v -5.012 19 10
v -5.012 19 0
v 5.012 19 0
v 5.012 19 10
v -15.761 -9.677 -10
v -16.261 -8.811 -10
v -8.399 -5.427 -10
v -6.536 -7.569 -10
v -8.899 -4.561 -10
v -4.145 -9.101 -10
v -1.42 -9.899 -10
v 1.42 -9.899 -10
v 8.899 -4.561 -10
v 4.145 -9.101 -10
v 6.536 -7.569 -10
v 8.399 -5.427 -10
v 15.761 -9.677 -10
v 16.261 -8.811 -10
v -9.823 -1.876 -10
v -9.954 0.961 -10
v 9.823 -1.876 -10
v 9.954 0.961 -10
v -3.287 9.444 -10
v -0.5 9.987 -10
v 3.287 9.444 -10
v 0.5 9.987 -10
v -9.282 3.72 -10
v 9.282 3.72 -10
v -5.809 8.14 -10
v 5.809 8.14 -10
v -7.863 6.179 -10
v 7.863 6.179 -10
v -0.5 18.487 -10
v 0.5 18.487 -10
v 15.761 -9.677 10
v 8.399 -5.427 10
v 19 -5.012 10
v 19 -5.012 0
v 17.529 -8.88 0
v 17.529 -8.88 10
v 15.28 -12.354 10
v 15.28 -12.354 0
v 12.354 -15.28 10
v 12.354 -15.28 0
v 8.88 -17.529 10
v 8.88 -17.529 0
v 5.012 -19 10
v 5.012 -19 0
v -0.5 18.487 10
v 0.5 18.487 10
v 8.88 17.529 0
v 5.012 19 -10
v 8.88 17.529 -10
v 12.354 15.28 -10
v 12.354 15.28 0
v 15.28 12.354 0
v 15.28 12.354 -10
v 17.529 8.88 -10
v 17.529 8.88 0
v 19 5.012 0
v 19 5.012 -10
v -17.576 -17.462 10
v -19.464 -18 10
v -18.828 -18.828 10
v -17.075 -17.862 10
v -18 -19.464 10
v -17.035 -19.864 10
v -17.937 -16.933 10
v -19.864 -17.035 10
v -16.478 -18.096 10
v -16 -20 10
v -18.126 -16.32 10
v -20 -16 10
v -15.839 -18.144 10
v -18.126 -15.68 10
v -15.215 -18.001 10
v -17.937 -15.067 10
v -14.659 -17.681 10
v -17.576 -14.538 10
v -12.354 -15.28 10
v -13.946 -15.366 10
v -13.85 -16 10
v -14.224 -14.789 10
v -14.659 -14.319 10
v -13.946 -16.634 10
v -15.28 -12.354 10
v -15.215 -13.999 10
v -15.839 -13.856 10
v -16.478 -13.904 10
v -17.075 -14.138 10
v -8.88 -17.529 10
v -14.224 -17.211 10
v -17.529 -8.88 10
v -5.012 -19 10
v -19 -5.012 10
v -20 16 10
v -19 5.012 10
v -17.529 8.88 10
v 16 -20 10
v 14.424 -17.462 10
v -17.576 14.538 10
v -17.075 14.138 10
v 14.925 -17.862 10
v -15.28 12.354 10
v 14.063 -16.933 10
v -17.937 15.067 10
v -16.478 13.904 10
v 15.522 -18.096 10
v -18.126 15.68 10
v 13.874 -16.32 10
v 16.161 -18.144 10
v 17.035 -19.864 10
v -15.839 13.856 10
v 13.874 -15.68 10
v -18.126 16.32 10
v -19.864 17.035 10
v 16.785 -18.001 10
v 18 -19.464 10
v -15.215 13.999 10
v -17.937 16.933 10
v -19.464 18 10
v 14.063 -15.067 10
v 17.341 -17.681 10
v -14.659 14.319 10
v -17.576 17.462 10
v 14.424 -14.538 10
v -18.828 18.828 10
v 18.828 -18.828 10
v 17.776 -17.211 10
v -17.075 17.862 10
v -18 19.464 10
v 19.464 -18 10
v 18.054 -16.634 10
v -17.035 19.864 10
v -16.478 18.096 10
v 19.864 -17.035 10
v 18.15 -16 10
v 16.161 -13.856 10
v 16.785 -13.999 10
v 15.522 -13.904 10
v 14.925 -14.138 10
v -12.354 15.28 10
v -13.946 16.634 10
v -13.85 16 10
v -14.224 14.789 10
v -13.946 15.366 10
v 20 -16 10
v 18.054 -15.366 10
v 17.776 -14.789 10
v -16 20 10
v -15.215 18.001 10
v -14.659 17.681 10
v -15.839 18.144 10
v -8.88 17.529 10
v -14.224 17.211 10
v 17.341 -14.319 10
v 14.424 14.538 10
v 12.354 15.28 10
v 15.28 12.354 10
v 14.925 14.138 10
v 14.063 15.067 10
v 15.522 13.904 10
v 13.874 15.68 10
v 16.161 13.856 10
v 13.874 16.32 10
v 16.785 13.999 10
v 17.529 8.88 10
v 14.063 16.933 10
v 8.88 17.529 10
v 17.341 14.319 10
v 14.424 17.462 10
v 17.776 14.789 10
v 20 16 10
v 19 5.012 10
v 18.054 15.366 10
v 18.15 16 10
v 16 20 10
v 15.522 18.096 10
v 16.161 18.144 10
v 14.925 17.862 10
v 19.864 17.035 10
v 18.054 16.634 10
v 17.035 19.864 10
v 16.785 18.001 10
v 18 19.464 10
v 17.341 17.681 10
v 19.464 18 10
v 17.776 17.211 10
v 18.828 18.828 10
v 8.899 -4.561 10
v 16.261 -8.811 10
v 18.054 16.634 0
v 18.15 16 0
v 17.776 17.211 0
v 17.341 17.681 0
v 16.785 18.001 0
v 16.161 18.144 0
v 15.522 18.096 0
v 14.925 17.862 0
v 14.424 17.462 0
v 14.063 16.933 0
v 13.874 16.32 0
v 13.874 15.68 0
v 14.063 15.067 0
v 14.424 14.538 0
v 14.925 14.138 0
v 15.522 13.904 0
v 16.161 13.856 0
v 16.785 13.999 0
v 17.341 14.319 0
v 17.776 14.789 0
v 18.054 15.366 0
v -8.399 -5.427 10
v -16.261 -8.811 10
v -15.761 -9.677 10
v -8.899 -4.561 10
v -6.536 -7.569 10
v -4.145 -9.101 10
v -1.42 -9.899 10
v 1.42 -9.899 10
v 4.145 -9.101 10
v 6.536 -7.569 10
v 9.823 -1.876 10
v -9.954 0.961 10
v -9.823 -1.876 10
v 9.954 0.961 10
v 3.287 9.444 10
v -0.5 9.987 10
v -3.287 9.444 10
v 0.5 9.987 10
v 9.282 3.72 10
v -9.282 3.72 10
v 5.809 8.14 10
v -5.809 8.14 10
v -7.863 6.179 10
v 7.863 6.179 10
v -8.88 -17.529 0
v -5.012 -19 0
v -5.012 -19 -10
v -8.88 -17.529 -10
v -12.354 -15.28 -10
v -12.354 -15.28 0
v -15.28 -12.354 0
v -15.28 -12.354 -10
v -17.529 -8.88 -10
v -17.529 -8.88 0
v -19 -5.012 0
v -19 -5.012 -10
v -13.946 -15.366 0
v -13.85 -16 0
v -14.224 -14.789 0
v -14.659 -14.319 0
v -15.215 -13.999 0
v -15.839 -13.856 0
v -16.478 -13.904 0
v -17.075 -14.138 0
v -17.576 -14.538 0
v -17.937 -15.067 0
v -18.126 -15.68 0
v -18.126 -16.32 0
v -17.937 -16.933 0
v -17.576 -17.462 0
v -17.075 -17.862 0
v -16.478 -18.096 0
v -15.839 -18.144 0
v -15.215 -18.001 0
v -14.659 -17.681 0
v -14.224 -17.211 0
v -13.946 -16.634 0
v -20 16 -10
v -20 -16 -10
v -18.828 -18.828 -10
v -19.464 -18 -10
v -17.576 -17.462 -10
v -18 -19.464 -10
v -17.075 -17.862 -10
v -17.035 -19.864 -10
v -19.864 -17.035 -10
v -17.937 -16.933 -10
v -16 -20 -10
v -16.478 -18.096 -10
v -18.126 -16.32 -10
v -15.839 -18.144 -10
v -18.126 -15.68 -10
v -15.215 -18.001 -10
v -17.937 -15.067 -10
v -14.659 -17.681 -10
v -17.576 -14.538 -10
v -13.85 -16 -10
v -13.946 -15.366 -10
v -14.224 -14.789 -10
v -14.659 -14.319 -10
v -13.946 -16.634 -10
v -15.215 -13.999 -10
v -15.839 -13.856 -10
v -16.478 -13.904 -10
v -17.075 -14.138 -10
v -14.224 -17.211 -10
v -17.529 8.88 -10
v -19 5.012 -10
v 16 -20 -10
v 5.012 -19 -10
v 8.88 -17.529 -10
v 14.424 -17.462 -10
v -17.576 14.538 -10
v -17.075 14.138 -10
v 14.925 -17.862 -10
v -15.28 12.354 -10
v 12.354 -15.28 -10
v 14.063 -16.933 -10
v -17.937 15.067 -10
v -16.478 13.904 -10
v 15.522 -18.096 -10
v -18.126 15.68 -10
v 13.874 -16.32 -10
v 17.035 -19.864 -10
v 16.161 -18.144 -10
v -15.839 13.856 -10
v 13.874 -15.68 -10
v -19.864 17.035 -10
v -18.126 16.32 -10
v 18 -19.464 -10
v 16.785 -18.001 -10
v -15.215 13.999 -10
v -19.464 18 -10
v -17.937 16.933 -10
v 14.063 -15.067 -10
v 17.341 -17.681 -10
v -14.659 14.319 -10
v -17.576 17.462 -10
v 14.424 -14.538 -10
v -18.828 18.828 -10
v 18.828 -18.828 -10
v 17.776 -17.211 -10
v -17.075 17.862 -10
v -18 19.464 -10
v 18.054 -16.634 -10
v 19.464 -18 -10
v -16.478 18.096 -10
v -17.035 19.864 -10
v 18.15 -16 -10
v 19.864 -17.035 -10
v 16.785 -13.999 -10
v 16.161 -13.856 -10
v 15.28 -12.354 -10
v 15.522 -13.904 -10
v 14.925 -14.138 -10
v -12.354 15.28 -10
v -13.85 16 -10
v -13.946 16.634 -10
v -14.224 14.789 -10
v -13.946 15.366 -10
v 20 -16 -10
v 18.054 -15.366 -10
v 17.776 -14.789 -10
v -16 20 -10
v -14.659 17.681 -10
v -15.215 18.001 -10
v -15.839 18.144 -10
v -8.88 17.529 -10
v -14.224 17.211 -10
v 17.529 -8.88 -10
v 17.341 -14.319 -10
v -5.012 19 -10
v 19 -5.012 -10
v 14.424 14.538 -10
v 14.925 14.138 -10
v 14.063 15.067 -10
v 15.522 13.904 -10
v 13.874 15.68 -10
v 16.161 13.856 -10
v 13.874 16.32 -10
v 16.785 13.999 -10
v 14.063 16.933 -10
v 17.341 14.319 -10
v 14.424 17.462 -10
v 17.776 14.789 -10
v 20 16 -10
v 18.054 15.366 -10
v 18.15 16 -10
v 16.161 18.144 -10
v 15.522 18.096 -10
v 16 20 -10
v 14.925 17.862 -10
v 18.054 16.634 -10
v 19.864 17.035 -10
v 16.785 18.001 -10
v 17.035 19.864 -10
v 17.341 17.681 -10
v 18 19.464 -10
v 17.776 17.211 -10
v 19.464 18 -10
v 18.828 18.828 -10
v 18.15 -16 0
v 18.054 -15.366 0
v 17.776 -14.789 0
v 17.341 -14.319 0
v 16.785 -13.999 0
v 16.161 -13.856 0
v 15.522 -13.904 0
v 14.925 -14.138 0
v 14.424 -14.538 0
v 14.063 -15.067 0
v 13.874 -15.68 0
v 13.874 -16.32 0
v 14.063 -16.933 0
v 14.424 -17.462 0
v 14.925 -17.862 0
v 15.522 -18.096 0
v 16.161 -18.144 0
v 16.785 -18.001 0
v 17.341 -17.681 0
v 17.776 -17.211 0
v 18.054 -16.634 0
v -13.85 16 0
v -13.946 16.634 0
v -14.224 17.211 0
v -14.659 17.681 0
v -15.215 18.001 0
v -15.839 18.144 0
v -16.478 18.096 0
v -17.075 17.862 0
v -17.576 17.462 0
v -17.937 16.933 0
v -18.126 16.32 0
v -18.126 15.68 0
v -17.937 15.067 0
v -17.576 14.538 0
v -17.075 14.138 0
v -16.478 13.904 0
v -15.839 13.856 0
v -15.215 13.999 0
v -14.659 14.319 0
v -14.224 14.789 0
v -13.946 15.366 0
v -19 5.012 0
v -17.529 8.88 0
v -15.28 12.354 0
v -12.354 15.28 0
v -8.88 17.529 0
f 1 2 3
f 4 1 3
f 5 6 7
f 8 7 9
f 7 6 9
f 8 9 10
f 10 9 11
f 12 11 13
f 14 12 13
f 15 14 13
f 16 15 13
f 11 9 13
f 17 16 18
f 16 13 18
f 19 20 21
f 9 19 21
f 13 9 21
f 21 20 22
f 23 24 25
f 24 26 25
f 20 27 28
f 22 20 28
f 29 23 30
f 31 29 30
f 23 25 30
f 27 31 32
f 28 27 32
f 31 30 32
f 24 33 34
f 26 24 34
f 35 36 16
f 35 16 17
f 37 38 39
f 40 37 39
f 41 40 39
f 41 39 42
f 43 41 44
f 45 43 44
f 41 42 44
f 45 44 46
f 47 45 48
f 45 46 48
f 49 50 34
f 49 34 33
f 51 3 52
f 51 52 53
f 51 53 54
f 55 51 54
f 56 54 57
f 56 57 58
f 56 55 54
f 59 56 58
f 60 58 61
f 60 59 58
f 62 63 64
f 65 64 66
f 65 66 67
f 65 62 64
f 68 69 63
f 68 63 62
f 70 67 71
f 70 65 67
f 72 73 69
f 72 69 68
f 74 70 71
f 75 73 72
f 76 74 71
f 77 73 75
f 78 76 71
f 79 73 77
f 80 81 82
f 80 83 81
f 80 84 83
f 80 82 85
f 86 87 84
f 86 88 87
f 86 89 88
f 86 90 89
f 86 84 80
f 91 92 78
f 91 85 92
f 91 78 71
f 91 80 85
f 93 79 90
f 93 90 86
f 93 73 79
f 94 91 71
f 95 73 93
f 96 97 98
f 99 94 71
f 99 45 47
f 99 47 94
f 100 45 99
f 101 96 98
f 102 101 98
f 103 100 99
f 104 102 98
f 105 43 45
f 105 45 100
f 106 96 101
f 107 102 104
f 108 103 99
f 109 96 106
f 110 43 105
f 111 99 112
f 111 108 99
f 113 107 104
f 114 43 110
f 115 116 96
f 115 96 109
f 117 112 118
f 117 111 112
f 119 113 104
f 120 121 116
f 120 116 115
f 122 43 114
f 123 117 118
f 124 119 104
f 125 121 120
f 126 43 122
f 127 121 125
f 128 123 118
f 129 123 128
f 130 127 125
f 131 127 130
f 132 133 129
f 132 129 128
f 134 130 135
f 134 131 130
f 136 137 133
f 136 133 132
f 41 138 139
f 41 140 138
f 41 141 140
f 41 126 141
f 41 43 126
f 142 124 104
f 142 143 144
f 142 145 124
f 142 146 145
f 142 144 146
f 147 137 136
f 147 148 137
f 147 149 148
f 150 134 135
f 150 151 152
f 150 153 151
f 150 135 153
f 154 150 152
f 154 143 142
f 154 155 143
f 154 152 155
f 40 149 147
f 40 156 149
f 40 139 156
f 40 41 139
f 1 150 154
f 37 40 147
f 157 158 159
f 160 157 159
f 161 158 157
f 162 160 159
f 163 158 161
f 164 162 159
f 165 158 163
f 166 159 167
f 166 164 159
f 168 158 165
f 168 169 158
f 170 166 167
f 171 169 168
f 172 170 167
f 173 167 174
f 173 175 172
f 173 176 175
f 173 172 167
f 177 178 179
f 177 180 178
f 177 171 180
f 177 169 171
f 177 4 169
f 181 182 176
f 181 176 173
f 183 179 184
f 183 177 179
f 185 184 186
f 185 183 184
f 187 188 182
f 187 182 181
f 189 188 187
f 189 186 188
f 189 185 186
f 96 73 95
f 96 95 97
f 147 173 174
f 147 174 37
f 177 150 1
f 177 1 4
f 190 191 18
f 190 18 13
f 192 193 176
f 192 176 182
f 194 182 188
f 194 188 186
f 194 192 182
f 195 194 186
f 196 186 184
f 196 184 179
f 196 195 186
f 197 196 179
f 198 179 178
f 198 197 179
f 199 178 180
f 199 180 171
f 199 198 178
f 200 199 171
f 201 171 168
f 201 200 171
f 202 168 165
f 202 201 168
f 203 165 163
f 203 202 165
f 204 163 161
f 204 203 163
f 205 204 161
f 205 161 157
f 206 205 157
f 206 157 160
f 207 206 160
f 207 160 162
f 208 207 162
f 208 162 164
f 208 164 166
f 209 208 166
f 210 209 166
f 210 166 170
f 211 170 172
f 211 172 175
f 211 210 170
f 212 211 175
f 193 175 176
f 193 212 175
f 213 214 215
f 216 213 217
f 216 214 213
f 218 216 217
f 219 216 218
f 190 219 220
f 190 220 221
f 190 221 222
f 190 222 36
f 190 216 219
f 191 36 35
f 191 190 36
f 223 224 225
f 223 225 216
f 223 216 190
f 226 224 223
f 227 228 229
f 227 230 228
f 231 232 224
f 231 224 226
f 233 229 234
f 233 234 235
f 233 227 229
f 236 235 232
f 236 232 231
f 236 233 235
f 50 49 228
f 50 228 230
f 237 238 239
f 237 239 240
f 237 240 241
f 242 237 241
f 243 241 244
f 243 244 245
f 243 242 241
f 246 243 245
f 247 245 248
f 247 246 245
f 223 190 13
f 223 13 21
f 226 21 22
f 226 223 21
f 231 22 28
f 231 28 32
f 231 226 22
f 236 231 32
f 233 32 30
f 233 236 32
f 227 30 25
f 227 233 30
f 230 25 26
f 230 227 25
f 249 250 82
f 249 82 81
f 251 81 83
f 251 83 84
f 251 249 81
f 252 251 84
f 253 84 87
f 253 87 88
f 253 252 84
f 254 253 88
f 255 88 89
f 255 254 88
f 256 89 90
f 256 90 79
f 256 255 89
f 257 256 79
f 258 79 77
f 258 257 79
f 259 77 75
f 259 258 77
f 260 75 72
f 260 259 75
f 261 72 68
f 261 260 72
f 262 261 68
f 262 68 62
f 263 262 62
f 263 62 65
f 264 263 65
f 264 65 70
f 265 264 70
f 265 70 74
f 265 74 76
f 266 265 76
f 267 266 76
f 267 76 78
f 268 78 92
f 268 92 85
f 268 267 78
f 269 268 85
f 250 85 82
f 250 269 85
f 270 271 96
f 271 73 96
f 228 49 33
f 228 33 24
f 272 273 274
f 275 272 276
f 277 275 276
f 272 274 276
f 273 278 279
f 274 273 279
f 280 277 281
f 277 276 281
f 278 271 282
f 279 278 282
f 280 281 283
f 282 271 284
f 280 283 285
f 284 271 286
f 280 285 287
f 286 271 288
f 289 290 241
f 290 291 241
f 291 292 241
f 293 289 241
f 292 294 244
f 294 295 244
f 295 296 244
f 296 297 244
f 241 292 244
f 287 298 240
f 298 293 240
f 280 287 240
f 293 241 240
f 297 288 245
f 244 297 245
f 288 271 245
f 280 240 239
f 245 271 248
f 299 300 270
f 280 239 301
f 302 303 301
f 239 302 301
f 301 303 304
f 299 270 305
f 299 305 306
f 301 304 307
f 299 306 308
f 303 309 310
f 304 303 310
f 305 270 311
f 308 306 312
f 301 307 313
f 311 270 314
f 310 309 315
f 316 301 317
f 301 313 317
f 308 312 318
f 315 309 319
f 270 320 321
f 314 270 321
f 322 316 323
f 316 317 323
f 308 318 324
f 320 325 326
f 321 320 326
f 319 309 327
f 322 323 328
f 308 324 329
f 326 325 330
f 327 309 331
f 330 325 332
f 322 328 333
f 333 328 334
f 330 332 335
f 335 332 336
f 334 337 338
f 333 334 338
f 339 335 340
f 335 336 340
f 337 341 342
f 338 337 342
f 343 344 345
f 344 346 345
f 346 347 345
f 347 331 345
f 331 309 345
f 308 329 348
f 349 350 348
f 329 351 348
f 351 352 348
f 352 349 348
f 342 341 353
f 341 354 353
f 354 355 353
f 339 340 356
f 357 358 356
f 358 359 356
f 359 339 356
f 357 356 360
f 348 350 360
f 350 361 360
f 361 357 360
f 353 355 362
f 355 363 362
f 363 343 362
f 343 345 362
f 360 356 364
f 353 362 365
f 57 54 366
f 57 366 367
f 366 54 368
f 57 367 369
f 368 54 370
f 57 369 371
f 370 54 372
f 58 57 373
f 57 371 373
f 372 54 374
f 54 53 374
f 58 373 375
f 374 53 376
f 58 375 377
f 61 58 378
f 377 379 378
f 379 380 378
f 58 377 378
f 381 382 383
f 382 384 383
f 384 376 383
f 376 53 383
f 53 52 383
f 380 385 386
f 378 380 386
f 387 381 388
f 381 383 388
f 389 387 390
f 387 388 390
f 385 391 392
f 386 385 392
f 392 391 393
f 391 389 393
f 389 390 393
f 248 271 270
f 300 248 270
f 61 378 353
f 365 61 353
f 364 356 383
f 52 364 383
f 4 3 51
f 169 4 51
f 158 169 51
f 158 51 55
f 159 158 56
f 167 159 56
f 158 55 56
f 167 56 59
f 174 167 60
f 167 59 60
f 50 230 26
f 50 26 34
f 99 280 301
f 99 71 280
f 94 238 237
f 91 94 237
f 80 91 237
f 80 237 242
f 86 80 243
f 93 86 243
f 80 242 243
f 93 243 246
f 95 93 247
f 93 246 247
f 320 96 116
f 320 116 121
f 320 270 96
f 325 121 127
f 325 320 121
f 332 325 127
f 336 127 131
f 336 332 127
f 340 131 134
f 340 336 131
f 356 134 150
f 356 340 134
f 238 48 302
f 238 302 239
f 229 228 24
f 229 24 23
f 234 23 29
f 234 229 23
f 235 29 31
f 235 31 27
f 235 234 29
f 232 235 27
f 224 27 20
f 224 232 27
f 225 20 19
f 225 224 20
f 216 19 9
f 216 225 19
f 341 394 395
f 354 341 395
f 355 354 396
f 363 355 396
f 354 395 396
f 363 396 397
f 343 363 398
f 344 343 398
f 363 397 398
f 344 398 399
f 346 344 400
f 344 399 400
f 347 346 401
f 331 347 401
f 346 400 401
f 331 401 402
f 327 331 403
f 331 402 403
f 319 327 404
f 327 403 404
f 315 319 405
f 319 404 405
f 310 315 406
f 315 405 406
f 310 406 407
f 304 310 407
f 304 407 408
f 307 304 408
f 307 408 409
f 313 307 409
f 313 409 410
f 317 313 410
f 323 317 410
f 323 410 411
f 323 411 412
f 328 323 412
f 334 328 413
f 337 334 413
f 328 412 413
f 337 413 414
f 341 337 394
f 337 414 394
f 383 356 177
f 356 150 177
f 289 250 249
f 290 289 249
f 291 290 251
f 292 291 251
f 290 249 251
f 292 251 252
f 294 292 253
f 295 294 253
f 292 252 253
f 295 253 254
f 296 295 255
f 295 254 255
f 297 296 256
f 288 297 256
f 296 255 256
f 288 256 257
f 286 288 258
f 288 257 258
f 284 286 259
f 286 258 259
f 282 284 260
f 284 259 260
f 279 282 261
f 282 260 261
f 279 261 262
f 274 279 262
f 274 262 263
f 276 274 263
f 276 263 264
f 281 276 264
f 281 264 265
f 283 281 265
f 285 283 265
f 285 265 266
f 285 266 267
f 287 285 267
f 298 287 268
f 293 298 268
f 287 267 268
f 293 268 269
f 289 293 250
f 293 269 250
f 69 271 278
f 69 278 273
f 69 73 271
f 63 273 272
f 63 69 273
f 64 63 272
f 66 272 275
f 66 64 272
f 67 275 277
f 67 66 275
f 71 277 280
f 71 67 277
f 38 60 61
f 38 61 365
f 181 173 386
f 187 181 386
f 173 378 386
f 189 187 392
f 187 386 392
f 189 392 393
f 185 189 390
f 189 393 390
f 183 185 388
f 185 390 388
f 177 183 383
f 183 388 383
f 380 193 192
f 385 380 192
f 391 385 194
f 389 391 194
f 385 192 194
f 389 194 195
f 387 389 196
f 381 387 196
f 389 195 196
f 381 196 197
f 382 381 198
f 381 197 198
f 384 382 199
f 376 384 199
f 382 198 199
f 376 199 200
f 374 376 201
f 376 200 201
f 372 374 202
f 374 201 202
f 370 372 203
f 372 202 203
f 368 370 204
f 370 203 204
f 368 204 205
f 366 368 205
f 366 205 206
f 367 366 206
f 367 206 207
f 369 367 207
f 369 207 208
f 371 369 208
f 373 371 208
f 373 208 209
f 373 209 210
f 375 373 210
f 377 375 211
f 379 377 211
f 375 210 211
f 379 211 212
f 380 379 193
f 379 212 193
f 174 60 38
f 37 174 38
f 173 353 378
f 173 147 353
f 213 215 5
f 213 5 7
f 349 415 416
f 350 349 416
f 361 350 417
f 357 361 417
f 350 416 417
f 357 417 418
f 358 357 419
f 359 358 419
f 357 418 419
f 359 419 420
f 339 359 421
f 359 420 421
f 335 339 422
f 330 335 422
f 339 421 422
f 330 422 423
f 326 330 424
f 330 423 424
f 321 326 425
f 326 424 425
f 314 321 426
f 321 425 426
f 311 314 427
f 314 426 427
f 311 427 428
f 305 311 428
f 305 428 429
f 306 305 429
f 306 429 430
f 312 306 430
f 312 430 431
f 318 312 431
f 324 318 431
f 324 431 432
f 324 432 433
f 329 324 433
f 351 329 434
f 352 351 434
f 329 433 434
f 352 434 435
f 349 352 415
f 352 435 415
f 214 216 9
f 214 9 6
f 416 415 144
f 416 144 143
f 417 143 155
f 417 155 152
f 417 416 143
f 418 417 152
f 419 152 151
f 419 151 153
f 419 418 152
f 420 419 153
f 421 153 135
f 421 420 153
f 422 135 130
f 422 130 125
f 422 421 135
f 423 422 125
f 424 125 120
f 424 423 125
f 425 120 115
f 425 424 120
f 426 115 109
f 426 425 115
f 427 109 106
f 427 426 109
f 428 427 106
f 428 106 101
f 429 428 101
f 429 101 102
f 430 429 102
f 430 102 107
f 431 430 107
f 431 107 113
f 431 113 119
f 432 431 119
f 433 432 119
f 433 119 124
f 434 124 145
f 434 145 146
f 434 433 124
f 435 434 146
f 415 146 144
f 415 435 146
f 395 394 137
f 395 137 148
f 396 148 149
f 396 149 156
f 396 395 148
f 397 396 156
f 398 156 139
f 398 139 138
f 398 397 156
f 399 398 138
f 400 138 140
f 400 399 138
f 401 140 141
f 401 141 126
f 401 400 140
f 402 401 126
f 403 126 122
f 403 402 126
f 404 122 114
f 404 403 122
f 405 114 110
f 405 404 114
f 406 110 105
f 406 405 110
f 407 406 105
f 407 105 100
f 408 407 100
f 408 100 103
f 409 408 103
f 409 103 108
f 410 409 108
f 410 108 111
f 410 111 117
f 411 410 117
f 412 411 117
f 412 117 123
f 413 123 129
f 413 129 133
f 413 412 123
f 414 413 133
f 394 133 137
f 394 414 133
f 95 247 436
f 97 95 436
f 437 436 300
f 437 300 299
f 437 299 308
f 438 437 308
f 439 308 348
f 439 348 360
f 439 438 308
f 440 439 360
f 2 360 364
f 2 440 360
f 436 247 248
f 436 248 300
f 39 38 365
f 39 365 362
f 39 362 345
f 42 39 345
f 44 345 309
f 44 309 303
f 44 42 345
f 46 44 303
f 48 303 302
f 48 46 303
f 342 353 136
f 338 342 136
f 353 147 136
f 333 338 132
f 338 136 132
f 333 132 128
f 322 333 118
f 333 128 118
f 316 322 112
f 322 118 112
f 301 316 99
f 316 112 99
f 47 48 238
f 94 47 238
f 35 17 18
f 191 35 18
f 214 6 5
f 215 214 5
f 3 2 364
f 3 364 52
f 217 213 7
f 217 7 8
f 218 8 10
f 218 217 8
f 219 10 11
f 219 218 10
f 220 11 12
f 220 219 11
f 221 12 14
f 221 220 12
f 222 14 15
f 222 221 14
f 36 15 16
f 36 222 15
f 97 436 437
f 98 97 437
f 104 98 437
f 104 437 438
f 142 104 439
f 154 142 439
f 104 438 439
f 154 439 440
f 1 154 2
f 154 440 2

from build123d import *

# Parameters (mm, degrees)
SKETCH1_W                = 40
SKETCH1_H                = 40
SKETCH1_R                = 2.15
BOSS_EXTRUDE1_DEPTH      = 10
BOSS_EXTRUDE1_DEPTH_BACK = 10
FILLET1_R                = 4
BOSS_EXTRUDE2_DEPTH      = 20


with BuildPart() as part:
    # Sketch1 → Boss-Extrude1 (new body, two sides)
    with BuildSketch(Plane.XY) as boss_extrude1_sk:
        Rectangle(SKETCH1_W, SKETCH1_H)
        with Locations((-16, 16)):
            Circle(SKETCH1_R, mode=Mode.SUBTRACT)
        with Locations((16, 16)):
            Circle(SKETCH1_R, mode=Mode.SUBTRACT)
        with Locations((16, -16)):
            Circle(SKETCH1_R, mode=Mode.SUBTRACT)
        with Locations((-16, -16)):
            Circle(SKETCH1_R, mode=Mode.SUBTRACT)
        with BuildLine():
            Line((-5.01223503, 19), (5.01223503, 19))
            ThreePointArc((5.01223503, 19), (13.89464825, 13.89464825), (19, 5.01223503))
            Line((19, 5.01223503), (19, -5.01223503))
            ThreePointArc((19, -5.01223503), (13.89464825, -13.89464825), (5.01223503, -19))
            Line((5.01223503, -19), (-5.01223503, -19))
            ThreePointArc((-5.01223503, -19), (-13.89464825, -13.89464825), (-19, -5.01223503))
            Line((-19, -5.01223503), (-19, 5.01223503))
            ThreePointArc((-19, 5.01223503), (-13.89464825, 13.89464825), (-5.01223503, 19))
        make_face(mode=Mode.SUBTRACT)
    extrude(amount=BOSS_EXTRUDE1_DEPTH)
    extrude(boss_extrude1_sk.sketch, amount=-BOSS_EXTRUDE1_DEPTH_BACK)

    # Fillet1
    fillet1_edges = [part.edges().sort_by_distance(p)[0] for p in [
        (-20, 20, 0),
        (20, 20, 0),
        (20, -20, 0),
        (-20, -20, 0),
    ]]
    fillet(fillet1_edges, radius=FILLET1_R)


with BuildPart() as body_2:
    # Sketch2 → Boss-Extrude2 (new body)
    with BuildSketch(Plane.XY.offset(10)):
        with BuildLine():
            Line((-8.899421946, -4.560733387), (-16.260637878, -8.810733387))
            Line((-16.260637878, -8.810733387), (-15.760637878, -9.676758791))
            Line((-15.760637878, -9.676758791), (-8.399421946, -5.426758791))
            ThreePointArc((-8.399421946, -5.426758791), (0, -10), (8.399421946, -5.426758791))
            Line((8.399421946, -5.426758791), (15.760637878, -9.676758791))
            Line((15.760637878, -9.676758791), (16.260637878, -8.810733387))
            Line((16.260637878, -8.810733387), (8.899421946, -4.560733387))
            ThreePointArc((8.899421946, -4.560733387), (8.660254038, 5), (0.5, 9.987492178))
            Line((0.5, 9.987492178), (0.5, 18.487492178))
            Line((0.5, 18.487492178), (-0.5, 18.487492178))
            Line((-0.5, 18.487492178), (-0.5, 9.987492178))
            ThreePointArc((-0.5, 9.987492178), (-8.660254038, 5), (-8.899421946, -4.560733387))
        make_face()
    extrude(amount=-BOSS_EXTRUDE2_DEPTH)


solid = Compound([part.part, body_2.part])
